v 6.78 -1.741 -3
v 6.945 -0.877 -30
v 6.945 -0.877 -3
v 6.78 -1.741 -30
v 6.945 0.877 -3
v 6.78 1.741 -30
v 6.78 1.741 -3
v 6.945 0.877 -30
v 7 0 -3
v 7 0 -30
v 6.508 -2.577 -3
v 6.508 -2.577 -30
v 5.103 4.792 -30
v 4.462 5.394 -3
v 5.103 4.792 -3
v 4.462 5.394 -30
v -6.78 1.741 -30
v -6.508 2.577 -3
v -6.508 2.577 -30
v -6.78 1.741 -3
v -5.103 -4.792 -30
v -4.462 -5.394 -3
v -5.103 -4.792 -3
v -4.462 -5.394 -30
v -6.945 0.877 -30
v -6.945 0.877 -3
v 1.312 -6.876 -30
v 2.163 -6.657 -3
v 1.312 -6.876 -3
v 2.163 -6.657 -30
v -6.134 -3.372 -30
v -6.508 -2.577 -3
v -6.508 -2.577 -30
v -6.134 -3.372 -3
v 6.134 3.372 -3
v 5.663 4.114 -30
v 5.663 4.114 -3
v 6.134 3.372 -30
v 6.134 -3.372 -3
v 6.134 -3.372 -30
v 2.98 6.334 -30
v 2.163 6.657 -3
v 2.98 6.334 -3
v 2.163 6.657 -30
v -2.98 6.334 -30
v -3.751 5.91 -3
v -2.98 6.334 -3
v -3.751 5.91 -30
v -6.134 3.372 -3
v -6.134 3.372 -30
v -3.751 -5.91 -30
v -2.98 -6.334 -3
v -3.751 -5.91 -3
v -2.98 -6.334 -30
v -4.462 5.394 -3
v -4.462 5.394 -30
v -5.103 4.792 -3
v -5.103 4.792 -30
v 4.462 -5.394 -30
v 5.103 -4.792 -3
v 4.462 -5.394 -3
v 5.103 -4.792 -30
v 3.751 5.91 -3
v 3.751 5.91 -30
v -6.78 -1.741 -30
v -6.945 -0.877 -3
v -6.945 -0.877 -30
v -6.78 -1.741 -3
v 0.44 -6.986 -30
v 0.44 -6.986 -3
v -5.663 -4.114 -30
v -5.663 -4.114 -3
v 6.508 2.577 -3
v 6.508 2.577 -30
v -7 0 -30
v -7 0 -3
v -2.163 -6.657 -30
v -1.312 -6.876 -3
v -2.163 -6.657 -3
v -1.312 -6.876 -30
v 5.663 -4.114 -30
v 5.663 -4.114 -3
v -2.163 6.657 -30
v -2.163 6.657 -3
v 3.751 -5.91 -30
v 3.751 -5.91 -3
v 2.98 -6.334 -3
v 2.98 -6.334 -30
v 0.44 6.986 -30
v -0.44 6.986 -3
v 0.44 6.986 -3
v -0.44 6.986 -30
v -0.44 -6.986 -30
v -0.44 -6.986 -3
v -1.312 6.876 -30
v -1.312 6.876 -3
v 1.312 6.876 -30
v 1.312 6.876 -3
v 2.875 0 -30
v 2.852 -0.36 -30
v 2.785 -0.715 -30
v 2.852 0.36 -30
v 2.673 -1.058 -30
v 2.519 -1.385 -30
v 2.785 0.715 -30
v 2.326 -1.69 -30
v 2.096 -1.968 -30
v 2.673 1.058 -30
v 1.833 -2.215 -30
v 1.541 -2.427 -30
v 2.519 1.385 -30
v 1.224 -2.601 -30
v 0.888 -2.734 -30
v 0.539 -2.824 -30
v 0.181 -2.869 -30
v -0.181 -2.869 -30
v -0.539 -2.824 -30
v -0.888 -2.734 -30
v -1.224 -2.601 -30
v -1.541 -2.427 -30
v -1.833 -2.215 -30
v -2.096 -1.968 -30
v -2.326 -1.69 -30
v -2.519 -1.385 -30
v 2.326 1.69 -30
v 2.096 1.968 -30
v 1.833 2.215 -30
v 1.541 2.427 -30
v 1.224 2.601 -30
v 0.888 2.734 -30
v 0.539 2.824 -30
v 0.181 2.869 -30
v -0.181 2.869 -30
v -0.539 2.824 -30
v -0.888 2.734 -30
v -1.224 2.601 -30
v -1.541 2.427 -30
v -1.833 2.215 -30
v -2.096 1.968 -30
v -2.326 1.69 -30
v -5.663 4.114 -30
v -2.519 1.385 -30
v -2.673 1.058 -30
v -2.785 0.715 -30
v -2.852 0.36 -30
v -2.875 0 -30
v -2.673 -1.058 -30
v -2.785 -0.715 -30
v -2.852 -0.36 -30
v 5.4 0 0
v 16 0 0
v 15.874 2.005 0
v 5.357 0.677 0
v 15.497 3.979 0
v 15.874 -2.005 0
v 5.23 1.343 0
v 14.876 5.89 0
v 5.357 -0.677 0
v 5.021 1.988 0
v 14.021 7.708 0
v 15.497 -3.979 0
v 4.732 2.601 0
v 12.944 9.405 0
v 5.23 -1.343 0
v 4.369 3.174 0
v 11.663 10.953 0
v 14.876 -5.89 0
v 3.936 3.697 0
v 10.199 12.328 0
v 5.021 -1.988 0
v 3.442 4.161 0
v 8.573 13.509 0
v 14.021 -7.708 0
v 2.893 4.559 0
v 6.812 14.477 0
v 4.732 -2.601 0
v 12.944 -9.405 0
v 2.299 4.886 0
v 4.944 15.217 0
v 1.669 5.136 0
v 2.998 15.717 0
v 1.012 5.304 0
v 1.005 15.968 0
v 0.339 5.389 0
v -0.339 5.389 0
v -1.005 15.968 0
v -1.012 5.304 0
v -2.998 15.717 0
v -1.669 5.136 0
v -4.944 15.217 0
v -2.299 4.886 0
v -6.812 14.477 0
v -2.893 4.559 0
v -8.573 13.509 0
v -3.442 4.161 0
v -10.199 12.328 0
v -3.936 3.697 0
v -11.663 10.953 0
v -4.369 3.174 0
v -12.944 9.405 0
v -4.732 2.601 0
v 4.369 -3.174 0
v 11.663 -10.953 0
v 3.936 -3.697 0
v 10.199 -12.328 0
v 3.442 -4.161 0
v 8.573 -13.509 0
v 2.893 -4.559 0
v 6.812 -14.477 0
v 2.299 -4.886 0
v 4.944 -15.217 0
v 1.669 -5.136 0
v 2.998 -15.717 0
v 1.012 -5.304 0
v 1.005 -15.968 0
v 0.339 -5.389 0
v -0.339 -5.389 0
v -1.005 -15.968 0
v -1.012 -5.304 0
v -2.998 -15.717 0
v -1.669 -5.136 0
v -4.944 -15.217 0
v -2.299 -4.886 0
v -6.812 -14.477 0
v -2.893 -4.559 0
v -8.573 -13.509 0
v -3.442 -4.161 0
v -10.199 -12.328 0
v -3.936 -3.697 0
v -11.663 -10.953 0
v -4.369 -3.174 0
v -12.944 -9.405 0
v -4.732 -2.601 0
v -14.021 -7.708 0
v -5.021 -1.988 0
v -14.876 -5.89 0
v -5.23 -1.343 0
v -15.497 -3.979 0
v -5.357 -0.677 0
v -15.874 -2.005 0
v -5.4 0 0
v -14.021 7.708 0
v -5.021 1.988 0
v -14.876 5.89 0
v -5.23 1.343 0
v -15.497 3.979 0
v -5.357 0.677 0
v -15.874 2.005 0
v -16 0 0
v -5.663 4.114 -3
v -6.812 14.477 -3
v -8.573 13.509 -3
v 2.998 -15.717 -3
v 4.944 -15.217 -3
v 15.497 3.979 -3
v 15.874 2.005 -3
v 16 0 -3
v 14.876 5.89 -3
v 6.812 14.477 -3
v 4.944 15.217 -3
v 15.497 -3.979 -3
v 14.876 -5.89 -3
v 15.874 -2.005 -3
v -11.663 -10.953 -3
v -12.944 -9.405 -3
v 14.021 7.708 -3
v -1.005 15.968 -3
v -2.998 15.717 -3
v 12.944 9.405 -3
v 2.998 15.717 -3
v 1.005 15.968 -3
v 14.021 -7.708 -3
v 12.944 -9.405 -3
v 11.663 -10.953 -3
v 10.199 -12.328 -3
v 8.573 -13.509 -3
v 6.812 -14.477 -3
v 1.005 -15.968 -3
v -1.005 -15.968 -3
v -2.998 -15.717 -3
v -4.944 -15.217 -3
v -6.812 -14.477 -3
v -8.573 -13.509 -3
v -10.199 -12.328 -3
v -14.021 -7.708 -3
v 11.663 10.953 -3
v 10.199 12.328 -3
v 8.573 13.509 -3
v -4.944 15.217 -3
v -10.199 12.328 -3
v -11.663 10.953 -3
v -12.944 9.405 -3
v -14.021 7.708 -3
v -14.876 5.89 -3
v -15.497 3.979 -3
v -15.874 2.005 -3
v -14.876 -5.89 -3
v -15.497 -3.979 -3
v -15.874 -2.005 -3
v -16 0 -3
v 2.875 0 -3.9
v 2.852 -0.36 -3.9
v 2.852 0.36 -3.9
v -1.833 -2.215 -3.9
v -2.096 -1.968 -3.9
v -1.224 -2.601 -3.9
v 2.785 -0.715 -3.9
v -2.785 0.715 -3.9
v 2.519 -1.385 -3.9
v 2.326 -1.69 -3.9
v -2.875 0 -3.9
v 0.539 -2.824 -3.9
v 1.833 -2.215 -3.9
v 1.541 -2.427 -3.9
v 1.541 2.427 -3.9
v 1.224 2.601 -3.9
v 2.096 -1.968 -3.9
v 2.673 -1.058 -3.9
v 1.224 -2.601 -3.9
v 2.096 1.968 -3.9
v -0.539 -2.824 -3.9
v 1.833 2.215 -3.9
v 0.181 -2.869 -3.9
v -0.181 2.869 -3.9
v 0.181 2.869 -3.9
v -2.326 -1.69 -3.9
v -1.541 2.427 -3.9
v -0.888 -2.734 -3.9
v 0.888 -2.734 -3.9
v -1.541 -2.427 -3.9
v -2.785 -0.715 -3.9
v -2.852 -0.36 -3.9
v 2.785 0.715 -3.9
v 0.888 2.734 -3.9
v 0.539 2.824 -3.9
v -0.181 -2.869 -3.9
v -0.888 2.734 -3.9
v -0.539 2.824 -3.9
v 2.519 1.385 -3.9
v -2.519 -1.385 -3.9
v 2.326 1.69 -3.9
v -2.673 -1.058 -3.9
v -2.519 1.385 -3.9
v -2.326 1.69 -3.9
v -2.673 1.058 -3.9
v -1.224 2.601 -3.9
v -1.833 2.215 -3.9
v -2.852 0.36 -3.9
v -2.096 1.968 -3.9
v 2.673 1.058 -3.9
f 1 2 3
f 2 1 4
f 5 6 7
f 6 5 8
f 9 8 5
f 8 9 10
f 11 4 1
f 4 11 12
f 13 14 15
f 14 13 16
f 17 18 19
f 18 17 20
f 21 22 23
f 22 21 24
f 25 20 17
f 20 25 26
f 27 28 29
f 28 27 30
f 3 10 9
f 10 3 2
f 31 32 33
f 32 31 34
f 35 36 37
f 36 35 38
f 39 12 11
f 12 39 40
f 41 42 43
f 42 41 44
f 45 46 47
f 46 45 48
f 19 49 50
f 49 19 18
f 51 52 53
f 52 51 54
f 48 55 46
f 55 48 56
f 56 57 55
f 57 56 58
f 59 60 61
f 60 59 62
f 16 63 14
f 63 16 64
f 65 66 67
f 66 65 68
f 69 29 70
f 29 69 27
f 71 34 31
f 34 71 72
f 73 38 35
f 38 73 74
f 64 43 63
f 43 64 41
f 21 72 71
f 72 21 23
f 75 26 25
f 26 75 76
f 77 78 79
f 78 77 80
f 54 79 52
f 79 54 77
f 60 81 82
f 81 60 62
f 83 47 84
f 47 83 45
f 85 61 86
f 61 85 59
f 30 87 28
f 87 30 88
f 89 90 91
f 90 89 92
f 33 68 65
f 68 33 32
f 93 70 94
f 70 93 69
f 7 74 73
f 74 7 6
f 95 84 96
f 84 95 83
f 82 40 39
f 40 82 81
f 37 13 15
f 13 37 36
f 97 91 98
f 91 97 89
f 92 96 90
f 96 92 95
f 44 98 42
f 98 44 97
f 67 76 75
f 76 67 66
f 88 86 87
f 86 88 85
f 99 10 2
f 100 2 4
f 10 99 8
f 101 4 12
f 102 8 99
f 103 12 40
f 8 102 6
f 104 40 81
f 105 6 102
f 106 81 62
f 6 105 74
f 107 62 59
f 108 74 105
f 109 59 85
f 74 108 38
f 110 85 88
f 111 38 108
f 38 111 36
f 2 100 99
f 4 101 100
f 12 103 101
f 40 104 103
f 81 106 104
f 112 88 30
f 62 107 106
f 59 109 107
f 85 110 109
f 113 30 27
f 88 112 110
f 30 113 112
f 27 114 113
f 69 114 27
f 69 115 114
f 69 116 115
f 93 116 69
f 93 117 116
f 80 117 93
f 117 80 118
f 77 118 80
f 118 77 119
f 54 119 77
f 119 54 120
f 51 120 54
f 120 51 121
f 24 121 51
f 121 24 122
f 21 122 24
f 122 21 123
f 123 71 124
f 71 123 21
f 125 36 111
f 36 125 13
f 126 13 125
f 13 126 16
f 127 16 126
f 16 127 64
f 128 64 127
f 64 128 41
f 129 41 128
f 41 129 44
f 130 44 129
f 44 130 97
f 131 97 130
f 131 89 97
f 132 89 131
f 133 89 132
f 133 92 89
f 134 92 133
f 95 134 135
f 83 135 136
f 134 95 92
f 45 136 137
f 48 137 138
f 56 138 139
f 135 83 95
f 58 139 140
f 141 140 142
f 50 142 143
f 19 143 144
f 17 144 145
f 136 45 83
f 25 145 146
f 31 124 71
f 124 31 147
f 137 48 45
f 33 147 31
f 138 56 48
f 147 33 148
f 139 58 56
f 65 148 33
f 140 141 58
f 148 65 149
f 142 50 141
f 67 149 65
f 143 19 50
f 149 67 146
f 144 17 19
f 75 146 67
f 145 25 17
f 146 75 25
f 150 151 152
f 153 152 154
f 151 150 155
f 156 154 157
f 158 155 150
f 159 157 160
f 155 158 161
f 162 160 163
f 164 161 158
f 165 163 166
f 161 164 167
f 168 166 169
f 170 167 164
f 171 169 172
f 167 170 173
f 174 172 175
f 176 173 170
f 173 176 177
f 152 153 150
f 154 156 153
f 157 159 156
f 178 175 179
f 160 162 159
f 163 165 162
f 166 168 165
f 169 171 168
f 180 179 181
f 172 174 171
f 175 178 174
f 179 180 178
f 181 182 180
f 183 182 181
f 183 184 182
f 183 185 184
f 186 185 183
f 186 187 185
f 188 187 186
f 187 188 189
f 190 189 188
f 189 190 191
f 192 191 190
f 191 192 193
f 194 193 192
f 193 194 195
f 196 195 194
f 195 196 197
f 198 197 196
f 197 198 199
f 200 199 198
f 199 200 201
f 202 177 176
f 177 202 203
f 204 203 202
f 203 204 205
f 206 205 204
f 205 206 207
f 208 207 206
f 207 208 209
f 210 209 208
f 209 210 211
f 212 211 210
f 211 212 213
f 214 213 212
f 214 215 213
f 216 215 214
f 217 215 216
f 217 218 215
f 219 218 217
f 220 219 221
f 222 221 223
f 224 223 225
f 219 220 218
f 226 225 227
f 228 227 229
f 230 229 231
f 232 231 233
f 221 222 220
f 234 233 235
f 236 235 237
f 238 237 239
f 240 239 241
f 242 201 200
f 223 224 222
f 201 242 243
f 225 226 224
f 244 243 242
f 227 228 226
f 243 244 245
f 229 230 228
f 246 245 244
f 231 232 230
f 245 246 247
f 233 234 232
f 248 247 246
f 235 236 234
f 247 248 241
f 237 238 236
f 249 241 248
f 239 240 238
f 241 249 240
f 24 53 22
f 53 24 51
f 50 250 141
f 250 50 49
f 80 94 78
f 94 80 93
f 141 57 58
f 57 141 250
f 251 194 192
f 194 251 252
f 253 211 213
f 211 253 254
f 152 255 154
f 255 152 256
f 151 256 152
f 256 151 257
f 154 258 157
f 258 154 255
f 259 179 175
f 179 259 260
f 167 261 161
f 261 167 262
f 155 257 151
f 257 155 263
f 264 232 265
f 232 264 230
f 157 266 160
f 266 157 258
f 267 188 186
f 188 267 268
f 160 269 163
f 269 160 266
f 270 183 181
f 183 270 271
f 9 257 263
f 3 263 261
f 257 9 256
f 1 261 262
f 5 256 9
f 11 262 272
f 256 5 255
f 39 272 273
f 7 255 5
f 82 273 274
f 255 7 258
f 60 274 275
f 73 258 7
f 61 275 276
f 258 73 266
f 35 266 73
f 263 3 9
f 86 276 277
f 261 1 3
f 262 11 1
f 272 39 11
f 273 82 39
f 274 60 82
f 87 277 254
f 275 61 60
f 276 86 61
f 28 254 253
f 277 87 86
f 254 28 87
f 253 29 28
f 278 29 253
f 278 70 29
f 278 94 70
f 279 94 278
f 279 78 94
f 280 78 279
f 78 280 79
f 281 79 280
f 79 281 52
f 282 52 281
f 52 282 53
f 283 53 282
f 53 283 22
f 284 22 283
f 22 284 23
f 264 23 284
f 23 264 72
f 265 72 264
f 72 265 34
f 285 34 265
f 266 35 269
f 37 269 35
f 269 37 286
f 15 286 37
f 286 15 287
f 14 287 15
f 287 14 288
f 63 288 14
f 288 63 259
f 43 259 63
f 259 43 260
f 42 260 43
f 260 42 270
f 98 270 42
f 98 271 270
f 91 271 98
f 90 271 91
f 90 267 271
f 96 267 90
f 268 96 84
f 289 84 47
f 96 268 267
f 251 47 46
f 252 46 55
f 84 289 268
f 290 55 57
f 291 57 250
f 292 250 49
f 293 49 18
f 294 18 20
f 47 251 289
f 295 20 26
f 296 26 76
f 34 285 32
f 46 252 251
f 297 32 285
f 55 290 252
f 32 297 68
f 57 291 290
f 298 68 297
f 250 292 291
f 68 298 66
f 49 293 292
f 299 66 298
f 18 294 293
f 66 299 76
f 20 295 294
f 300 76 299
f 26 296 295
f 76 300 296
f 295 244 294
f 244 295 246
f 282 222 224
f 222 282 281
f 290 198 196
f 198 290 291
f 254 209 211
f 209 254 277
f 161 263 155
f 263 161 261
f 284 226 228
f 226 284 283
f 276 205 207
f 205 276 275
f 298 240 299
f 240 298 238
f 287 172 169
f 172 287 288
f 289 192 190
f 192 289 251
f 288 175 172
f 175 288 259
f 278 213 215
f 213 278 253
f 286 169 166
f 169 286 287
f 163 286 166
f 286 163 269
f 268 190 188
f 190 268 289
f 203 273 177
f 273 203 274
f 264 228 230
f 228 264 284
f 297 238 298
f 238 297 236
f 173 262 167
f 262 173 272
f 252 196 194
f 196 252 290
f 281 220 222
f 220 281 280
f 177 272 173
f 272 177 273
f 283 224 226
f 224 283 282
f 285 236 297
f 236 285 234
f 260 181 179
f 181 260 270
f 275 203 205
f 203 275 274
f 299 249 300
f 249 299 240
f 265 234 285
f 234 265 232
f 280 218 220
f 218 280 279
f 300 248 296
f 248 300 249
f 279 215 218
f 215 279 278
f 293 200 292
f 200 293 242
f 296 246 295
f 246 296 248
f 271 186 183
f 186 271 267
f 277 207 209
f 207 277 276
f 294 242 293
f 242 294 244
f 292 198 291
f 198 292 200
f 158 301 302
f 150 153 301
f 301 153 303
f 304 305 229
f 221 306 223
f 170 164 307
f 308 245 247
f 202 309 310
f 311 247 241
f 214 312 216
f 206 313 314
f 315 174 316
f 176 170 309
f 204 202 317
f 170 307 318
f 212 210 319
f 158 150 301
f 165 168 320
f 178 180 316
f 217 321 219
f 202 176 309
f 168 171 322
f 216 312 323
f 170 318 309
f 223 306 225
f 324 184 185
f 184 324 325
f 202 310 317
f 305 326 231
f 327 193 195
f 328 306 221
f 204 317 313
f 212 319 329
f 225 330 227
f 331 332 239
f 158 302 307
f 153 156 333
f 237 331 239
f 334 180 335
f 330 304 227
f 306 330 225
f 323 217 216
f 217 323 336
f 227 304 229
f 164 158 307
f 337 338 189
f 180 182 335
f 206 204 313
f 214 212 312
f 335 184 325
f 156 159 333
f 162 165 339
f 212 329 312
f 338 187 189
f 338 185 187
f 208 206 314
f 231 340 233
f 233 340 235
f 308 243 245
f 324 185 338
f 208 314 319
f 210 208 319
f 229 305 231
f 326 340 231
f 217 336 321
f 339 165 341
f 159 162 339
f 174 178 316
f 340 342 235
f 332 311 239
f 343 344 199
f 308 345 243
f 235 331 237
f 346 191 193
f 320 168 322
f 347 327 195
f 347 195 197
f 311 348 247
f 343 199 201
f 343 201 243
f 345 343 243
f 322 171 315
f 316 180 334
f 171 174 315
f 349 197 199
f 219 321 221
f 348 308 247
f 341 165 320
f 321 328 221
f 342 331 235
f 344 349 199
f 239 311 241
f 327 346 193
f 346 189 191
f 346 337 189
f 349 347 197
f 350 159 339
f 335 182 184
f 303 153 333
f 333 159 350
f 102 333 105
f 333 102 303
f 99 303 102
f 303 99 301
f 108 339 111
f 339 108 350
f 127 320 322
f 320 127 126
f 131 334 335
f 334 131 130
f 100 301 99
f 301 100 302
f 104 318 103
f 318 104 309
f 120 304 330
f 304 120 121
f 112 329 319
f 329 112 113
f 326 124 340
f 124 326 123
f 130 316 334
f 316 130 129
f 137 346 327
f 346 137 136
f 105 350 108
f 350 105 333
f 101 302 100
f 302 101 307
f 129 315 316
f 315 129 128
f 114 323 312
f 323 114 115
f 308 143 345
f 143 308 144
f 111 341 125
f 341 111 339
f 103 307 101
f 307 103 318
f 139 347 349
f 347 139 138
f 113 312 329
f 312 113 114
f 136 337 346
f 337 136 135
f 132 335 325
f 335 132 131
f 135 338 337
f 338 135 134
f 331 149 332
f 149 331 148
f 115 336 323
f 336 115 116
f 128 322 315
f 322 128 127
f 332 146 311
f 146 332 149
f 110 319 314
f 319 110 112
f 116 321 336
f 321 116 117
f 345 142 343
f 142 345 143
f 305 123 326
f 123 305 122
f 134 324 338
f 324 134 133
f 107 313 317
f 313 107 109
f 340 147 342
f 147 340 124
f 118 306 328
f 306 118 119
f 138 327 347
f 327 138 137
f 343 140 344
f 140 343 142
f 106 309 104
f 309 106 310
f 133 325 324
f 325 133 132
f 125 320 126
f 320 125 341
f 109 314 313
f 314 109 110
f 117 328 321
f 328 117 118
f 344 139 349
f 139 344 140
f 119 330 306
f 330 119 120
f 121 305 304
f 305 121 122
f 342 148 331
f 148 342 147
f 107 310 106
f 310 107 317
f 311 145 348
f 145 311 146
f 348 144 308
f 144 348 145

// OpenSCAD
$fn = 50;


difference() {
	union() {
		translate(v = [0, 0, -30.0000000000]) {
			cylinder(h = 30, r = 7.0000000000);
		}
		translate(v = [0, 0, -3.0000000000]) {
			cylinder(h = 3, r = 16.0000000000);
		}
	}
	union() {
		translate(v = [0, 0, 0]) {
			rotate(a = [0, 0, 0]) {
				difference() {
					union() {
						#translate(v = [0, 0, -30.0000000000]) {
							cylinder(h = 30, r = 2.6000000000);
						}
						#translate(v = [0, 0, -3.9000000000]) {
							cylinder(h = 3.9000000000, r = 7.0000000000, r1 = 2.8750000000, r2 = 5.4000000000);
						}
						#translate(v = [0, 0, -30.0000000000]) {
							cylinder(h = 30, r = 2.8750000000);
						}
						#translate(v = [0, 0, -30.0000000000]) {
							cylinder(h = 30, r = 2.6000000000);
						}
					}
					union();
				}
			}
		}
	}
}
